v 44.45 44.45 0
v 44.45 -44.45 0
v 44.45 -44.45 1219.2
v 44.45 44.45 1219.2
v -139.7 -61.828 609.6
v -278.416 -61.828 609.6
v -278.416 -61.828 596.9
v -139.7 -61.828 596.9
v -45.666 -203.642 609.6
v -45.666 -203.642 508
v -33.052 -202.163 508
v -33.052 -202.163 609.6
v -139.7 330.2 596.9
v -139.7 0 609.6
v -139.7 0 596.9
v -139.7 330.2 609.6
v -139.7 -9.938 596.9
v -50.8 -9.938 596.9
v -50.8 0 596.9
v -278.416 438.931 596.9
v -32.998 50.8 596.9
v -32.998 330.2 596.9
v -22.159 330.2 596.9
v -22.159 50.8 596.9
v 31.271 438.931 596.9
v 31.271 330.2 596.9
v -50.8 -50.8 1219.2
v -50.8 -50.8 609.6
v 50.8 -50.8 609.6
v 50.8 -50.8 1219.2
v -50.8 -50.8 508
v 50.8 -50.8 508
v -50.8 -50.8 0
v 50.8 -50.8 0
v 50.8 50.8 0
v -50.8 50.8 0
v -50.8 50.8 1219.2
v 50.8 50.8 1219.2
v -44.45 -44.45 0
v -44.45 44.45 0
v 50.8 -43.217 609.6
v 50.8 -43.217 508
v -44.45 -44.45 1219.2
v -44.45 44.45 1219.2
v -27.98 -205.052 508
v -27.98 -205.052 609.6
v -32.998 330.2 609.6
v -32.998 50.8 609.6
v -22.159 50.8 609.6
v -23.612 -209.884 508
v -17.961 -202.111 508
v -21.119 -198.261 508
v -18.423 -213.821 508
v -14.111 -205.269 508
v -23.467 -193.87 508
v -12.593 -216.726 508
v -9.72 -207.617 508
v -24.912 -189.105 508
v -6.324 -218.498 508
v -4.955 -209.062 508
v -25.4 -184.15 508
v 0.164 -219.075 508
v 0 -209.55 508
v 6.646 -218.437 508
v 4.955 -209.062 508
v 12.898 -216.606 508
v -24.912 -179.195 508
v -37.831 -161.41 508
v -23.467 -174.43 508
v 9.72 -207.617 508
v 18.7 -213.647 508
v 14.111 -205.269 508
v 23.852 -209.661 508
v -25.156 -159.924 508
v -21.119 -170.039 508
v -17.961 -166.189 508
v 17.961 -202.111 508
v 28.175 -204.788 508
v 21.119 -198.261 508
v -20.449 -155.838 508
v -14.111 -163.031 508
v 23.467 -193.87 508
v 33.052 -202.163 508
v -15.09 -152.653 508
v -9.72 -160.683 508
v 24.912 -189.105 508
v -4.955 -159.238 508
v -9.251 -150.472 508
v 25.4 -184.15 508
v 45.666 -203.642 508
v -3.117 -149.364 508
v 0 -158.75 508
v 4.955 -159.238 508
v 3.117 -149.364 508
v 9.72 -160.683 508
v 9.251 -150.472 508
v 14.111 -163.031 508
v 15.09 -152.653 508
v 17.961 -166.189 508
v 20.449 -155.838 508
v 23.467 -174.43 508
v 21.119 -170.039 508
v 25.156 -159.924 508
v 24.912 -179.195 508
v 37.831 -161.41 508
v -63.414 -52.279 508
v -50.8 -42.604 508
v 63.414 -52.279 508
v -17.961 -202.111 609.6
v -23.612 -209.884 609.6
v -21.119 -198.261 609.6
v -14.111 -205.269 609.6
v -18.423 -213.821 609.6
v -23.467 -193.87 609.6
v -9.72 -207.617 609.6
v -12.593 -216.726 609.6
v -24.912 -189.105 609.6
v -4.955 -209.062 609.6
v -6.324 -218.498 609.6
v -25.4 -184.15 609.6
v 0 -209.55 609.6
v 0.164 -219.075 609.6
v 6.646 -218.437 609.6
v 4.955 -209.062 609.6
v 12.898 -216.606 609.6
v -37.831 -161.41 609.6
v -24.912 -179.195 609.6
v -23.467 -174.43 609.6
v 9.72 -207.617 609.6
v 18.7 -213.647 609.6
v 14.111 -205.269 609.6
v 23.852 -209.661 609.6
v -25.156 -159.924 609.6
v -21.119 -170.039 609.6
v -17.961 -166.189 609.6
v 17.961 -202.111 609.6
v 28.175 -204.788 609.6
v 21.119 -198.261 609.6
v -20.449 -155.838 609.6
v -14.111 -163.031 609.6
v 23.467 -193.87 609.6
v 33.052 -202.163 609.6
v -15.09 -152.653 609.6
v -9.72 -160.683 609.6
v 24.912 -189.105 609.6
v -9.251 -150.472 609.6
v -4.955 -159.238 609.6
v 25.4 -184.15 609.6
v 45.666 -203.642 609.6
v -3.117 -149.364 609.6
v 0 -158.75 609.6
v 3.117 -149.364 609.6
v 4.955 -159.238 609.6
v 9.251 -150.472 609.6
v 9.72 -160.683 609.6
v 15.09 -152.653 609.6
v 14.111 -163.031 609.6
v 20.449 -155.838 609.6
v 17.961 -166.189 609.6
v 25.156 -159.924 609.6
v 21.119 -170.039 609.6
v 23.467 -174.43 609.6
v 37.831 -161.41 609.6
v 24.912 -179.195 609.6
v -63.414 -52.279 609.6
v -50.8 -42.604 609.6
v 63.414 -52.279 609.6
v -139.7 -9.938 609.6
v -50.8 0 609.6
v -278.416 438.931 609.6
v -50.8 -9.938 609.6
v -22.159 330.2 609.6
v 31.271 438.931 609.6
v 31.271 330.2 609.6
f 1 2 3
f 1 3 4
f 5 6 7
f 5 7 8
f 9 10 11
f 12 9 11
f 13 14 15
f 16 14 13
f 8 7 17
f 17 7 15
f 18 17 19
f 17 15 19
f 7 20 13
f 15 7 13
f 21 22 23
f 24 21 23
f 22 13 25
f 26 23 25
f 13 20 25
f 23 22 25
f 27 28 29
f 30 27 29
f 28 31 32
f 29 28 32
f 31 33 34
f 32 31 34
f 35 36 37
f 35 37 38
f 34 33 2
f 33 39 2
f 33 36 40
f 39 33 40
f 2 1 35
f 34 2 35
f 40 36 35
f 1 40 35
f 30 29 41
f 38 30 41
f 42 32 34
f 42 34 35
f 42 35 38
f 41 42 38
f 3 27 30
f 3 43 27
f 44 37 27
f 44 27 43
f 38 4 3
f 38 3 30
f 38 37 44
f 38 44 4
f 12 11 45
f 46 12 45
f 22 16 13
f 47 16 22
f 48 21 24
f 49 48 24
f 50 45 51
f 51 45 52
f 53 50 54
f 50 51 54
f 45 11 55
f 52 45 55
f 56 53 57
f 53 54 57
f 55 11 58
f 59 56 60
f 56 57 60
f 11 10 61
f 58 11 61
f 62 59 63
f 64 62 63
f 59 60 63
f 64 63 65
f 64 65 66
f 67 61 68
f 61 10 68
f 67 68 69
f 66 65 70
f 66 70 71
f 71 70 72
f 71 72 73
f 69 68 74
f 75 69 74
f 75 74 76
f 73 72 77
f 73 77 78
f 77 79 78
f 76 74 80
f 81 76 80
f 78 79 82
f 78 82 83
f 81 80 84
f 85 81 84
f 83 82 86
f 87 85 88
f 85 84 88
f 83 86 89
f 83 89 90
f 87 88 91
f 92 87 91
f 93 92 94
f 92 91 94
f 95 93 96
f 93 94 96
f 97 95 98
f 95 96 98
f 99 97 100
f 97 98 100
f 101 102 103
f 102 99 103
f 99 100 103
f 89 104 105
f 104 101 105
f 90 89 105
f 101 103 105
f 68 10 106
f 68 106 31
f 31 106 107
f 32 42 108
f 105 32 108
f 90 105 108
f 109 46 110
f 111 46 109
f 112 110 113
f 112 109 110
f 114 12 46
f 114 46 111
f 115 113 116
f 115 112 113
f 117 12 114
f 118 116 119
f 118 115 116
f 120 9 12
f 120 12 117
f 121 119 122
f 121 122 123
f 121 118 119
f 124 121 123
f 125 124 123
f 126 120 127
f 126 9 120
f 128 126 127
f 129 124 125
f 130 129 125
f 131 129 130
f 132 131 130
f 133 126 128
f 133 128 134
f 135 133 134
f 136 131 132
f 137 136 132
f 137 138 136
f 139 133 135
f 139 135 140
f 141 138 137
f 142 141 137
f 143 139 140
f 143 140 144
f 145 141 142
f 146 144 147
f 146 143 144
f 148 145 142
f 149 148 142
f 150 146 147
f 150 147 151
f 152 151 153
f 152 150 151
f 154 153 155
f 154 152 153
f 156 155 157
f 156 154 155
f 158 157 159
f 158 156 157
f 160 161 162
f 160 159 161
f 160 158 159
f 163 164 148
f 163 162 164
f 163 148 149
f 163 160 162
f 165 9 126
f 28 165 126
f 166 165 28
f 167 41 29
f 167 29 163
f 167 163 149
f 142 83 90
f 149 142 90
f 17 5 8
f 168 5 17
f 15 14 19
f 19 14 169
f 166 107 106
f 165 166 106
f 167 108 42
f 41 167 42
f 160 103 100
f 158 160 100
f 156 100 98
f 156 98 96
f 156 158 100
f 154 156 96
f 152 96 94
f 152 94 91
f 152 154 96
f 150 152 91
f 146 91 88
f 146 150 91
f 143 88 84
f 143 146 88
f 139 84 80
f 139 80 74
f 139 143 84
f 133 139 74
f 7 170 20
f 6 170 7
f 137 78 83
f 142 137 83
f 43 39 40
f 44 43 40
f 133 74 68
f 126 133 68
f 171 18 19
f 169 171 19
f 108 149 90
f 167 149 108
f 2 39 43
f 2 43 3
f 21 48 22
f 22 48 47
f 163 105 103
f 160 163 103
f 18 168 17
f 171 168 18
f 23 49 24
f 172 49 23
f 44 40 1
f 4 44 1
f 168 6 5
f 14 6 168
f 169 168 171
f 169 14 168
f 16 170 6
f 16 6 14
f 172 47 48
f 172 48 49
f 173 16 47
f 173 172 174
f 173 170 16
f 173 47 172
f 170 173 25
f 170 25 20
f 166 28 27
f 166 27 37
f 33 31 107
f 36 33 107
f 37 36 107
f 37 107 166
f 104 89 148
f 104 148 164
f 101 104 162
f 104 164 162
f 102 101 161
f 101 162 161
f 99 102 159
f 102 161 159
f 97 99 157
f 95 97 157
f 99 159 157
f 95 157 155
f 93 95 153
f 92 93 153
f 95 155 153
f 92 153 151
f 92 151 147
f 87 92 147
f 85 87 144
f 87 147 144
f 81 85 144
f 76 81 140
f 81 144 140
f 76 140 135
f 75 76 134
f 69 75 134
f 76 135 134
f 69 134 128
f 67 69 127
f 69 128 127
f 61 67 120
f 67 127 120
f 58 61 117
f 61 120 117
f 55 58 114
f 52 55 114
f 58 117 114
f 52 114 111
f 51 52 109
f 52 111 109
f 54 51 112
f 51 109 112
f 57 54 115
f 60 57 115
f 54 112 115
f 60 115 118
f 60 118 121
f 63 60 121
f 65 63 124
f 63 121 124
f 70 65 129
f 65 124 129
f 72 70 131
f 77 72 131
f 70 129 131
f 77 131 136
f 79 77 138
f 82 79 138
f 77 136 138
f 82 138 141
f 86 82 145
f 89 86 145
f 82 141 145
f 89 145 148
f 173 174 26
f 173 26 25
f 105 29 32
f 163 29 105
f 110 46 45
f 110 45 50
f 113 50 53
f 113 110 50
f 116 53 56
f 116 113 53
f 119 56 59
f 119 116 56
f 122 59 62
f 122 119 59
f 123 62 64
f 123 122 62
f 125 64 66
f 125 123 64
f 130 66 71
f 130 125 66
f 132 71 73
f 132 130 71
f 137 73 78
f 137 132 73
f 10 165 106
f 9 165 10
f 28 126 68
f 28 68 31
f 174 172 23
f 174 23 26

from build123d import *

# Parameters (mm, degrees)
F0_W     = 101.6
F0_H     = 101.6
F0_W_2   = 88.9
F0_H_2   = 88.9
F1_DEPTH = 1219.2
F3_R     = 25.4
F4_DEPTH = 101.6
F5_W     = 10.839459
F5_H     = 279.4
F5_W_2   = 88.9
F5_H_2   = 9.937655
F6_DEPTH = 12.7


with BuildPart() as f1:
    # F0 (on Top) → F1 (new body)
    with BuildSketch(Plane.XY):
        Rectangle(F0_W, F0_H)
        Rectangle(F0_W_2, F0_H_2, mode=Mode.SUBTRACT)
    extrude(amount=F1_DEPTH)

    # F3 (on offset) → F4 (join)
    with BuildSketch(Plane.XY.offset(609.6)):
        Polygon((-63.413588, -52.278986), (-50.8, -50.8), (-50.8, -42.603761), align=None)
        Polygon((-37.830632, -161.409753), (-50.8, -50.8), (-63.413588, -52.278986), (-45.665757, -203.642041), (-33.052169, -202.163055), (-34.687367, -188.21721), align=None)
        with BuildLine():
            ThreePointArc((-25.156298, -159.923644), (-33.097545, -173.000645), (-34.687367, -188.21721))
            ThreePointArc((-34.687367, -188.21721), (-32.444558, -197.076958), (-27.980041, -205.051506))
            ThreePointArc((-27.980041, -205.051506), (0.163736, -219.074616), (28.17479, -204.788237))
            ThreePointArc((28.17479, -204.788237), (32.504806, -196.92471), (34.687367, -188.217211))
            ThreePointArc((34.687367, -188.217211), (34.865541, -186.187073), (34.925, -184.15))
            ThreePointArc((34.925, -184.15), (32.390889, -171.089144), (25.156298, -159.923644))
            ThreePointArc((25.156298, -159.923644), (0, -149.225), (-25.156298, -159.923644))
        make_face()
        with Locations((0, -184.15)):
            Circle(F3_R, mode=Mode.SUBTRACT)
        with BuildLine():
            Line((-25.156298, -159.923644), (-37.830632, -161.409753))
            Line((-37.830632, -161.409753), (-34.687367, -188.21721))
            ThreePointArc((-34.687367, -188.21721), (-33.097545, -173.000645), (-25.156298, -159.923644))
        make_face()
        with BuildLine():
            ThreePointArc((-27.980041, -205.051506), (-32.444558, -197.076958), (-34.687367, -188.21721))
            Line((-34.687367, -188.21721), (-33.052169, -202.163055))
            Line((-33.052169, -202.163055), (-27.980041, -205.051506))
        make_face()
        with BuildLine():
            Line((33.052169, -202.163055), (34.687367, -188.217211))
            ThreePointArc((34.687367, -188.217211), (32.504806, -196.92471), (28.17479, -204.788237))
            Line((28.17479, -204.788237), (33.052169, -202.163055))
        make_face()
        with BuildLine():
            Line((34.687367, -188.217211), (37.830632, -161.409753))
            Line((37.830632, -161.409753), (25.156298, -159.923644))
            ThreePointArc((25.156298, -159.923644), (32.390889, -171.089144), (34.925, -184.15))
            ThreePointArc((34.925, -184.15), (34.865541, -186.187073), (34.687367, -188.217211))
        make_face()
        Polygon((63.413588, -52.278986), (50.8, -50.8), (37.830632, -161.409753), (34.687367, -188.217211), (33.052169, -202.163055), (45.665757, -203.642041), align=None)
        Polygon((50.8, -43.217294), (50.8, -50.8), (63.413588, -52.278986), align=None)
    extrude(amount=-F4_DEPTH)


with BuildPart() as f6:
    # F5 (on offset) → F6 (new body)
    with BuildSketch(Plane.XY.offset(609.6)):
        Polygon((-139.7, 330.2), (-32.9981, 330.2), (-22.158641, 330.2), (31.271237, 330.2), (31.271237, 438.93075), (-278.416485, 438.93075), (-278.416485, -61.827805), (-139.7, -61.827805), (-139.7, -9.937655), (-139.7, 0), align=None)
        with Locations((-27.57837, 190.5)):
            Rectangle(F5_W, F5_H)
        with Locations((-95.25, -4.968827)):
            Rectangle(F5_W_2, F5_H_2)
    extrude(amount=-F6_DEPTH)


solid = Compound([f1.part, f6.part])
